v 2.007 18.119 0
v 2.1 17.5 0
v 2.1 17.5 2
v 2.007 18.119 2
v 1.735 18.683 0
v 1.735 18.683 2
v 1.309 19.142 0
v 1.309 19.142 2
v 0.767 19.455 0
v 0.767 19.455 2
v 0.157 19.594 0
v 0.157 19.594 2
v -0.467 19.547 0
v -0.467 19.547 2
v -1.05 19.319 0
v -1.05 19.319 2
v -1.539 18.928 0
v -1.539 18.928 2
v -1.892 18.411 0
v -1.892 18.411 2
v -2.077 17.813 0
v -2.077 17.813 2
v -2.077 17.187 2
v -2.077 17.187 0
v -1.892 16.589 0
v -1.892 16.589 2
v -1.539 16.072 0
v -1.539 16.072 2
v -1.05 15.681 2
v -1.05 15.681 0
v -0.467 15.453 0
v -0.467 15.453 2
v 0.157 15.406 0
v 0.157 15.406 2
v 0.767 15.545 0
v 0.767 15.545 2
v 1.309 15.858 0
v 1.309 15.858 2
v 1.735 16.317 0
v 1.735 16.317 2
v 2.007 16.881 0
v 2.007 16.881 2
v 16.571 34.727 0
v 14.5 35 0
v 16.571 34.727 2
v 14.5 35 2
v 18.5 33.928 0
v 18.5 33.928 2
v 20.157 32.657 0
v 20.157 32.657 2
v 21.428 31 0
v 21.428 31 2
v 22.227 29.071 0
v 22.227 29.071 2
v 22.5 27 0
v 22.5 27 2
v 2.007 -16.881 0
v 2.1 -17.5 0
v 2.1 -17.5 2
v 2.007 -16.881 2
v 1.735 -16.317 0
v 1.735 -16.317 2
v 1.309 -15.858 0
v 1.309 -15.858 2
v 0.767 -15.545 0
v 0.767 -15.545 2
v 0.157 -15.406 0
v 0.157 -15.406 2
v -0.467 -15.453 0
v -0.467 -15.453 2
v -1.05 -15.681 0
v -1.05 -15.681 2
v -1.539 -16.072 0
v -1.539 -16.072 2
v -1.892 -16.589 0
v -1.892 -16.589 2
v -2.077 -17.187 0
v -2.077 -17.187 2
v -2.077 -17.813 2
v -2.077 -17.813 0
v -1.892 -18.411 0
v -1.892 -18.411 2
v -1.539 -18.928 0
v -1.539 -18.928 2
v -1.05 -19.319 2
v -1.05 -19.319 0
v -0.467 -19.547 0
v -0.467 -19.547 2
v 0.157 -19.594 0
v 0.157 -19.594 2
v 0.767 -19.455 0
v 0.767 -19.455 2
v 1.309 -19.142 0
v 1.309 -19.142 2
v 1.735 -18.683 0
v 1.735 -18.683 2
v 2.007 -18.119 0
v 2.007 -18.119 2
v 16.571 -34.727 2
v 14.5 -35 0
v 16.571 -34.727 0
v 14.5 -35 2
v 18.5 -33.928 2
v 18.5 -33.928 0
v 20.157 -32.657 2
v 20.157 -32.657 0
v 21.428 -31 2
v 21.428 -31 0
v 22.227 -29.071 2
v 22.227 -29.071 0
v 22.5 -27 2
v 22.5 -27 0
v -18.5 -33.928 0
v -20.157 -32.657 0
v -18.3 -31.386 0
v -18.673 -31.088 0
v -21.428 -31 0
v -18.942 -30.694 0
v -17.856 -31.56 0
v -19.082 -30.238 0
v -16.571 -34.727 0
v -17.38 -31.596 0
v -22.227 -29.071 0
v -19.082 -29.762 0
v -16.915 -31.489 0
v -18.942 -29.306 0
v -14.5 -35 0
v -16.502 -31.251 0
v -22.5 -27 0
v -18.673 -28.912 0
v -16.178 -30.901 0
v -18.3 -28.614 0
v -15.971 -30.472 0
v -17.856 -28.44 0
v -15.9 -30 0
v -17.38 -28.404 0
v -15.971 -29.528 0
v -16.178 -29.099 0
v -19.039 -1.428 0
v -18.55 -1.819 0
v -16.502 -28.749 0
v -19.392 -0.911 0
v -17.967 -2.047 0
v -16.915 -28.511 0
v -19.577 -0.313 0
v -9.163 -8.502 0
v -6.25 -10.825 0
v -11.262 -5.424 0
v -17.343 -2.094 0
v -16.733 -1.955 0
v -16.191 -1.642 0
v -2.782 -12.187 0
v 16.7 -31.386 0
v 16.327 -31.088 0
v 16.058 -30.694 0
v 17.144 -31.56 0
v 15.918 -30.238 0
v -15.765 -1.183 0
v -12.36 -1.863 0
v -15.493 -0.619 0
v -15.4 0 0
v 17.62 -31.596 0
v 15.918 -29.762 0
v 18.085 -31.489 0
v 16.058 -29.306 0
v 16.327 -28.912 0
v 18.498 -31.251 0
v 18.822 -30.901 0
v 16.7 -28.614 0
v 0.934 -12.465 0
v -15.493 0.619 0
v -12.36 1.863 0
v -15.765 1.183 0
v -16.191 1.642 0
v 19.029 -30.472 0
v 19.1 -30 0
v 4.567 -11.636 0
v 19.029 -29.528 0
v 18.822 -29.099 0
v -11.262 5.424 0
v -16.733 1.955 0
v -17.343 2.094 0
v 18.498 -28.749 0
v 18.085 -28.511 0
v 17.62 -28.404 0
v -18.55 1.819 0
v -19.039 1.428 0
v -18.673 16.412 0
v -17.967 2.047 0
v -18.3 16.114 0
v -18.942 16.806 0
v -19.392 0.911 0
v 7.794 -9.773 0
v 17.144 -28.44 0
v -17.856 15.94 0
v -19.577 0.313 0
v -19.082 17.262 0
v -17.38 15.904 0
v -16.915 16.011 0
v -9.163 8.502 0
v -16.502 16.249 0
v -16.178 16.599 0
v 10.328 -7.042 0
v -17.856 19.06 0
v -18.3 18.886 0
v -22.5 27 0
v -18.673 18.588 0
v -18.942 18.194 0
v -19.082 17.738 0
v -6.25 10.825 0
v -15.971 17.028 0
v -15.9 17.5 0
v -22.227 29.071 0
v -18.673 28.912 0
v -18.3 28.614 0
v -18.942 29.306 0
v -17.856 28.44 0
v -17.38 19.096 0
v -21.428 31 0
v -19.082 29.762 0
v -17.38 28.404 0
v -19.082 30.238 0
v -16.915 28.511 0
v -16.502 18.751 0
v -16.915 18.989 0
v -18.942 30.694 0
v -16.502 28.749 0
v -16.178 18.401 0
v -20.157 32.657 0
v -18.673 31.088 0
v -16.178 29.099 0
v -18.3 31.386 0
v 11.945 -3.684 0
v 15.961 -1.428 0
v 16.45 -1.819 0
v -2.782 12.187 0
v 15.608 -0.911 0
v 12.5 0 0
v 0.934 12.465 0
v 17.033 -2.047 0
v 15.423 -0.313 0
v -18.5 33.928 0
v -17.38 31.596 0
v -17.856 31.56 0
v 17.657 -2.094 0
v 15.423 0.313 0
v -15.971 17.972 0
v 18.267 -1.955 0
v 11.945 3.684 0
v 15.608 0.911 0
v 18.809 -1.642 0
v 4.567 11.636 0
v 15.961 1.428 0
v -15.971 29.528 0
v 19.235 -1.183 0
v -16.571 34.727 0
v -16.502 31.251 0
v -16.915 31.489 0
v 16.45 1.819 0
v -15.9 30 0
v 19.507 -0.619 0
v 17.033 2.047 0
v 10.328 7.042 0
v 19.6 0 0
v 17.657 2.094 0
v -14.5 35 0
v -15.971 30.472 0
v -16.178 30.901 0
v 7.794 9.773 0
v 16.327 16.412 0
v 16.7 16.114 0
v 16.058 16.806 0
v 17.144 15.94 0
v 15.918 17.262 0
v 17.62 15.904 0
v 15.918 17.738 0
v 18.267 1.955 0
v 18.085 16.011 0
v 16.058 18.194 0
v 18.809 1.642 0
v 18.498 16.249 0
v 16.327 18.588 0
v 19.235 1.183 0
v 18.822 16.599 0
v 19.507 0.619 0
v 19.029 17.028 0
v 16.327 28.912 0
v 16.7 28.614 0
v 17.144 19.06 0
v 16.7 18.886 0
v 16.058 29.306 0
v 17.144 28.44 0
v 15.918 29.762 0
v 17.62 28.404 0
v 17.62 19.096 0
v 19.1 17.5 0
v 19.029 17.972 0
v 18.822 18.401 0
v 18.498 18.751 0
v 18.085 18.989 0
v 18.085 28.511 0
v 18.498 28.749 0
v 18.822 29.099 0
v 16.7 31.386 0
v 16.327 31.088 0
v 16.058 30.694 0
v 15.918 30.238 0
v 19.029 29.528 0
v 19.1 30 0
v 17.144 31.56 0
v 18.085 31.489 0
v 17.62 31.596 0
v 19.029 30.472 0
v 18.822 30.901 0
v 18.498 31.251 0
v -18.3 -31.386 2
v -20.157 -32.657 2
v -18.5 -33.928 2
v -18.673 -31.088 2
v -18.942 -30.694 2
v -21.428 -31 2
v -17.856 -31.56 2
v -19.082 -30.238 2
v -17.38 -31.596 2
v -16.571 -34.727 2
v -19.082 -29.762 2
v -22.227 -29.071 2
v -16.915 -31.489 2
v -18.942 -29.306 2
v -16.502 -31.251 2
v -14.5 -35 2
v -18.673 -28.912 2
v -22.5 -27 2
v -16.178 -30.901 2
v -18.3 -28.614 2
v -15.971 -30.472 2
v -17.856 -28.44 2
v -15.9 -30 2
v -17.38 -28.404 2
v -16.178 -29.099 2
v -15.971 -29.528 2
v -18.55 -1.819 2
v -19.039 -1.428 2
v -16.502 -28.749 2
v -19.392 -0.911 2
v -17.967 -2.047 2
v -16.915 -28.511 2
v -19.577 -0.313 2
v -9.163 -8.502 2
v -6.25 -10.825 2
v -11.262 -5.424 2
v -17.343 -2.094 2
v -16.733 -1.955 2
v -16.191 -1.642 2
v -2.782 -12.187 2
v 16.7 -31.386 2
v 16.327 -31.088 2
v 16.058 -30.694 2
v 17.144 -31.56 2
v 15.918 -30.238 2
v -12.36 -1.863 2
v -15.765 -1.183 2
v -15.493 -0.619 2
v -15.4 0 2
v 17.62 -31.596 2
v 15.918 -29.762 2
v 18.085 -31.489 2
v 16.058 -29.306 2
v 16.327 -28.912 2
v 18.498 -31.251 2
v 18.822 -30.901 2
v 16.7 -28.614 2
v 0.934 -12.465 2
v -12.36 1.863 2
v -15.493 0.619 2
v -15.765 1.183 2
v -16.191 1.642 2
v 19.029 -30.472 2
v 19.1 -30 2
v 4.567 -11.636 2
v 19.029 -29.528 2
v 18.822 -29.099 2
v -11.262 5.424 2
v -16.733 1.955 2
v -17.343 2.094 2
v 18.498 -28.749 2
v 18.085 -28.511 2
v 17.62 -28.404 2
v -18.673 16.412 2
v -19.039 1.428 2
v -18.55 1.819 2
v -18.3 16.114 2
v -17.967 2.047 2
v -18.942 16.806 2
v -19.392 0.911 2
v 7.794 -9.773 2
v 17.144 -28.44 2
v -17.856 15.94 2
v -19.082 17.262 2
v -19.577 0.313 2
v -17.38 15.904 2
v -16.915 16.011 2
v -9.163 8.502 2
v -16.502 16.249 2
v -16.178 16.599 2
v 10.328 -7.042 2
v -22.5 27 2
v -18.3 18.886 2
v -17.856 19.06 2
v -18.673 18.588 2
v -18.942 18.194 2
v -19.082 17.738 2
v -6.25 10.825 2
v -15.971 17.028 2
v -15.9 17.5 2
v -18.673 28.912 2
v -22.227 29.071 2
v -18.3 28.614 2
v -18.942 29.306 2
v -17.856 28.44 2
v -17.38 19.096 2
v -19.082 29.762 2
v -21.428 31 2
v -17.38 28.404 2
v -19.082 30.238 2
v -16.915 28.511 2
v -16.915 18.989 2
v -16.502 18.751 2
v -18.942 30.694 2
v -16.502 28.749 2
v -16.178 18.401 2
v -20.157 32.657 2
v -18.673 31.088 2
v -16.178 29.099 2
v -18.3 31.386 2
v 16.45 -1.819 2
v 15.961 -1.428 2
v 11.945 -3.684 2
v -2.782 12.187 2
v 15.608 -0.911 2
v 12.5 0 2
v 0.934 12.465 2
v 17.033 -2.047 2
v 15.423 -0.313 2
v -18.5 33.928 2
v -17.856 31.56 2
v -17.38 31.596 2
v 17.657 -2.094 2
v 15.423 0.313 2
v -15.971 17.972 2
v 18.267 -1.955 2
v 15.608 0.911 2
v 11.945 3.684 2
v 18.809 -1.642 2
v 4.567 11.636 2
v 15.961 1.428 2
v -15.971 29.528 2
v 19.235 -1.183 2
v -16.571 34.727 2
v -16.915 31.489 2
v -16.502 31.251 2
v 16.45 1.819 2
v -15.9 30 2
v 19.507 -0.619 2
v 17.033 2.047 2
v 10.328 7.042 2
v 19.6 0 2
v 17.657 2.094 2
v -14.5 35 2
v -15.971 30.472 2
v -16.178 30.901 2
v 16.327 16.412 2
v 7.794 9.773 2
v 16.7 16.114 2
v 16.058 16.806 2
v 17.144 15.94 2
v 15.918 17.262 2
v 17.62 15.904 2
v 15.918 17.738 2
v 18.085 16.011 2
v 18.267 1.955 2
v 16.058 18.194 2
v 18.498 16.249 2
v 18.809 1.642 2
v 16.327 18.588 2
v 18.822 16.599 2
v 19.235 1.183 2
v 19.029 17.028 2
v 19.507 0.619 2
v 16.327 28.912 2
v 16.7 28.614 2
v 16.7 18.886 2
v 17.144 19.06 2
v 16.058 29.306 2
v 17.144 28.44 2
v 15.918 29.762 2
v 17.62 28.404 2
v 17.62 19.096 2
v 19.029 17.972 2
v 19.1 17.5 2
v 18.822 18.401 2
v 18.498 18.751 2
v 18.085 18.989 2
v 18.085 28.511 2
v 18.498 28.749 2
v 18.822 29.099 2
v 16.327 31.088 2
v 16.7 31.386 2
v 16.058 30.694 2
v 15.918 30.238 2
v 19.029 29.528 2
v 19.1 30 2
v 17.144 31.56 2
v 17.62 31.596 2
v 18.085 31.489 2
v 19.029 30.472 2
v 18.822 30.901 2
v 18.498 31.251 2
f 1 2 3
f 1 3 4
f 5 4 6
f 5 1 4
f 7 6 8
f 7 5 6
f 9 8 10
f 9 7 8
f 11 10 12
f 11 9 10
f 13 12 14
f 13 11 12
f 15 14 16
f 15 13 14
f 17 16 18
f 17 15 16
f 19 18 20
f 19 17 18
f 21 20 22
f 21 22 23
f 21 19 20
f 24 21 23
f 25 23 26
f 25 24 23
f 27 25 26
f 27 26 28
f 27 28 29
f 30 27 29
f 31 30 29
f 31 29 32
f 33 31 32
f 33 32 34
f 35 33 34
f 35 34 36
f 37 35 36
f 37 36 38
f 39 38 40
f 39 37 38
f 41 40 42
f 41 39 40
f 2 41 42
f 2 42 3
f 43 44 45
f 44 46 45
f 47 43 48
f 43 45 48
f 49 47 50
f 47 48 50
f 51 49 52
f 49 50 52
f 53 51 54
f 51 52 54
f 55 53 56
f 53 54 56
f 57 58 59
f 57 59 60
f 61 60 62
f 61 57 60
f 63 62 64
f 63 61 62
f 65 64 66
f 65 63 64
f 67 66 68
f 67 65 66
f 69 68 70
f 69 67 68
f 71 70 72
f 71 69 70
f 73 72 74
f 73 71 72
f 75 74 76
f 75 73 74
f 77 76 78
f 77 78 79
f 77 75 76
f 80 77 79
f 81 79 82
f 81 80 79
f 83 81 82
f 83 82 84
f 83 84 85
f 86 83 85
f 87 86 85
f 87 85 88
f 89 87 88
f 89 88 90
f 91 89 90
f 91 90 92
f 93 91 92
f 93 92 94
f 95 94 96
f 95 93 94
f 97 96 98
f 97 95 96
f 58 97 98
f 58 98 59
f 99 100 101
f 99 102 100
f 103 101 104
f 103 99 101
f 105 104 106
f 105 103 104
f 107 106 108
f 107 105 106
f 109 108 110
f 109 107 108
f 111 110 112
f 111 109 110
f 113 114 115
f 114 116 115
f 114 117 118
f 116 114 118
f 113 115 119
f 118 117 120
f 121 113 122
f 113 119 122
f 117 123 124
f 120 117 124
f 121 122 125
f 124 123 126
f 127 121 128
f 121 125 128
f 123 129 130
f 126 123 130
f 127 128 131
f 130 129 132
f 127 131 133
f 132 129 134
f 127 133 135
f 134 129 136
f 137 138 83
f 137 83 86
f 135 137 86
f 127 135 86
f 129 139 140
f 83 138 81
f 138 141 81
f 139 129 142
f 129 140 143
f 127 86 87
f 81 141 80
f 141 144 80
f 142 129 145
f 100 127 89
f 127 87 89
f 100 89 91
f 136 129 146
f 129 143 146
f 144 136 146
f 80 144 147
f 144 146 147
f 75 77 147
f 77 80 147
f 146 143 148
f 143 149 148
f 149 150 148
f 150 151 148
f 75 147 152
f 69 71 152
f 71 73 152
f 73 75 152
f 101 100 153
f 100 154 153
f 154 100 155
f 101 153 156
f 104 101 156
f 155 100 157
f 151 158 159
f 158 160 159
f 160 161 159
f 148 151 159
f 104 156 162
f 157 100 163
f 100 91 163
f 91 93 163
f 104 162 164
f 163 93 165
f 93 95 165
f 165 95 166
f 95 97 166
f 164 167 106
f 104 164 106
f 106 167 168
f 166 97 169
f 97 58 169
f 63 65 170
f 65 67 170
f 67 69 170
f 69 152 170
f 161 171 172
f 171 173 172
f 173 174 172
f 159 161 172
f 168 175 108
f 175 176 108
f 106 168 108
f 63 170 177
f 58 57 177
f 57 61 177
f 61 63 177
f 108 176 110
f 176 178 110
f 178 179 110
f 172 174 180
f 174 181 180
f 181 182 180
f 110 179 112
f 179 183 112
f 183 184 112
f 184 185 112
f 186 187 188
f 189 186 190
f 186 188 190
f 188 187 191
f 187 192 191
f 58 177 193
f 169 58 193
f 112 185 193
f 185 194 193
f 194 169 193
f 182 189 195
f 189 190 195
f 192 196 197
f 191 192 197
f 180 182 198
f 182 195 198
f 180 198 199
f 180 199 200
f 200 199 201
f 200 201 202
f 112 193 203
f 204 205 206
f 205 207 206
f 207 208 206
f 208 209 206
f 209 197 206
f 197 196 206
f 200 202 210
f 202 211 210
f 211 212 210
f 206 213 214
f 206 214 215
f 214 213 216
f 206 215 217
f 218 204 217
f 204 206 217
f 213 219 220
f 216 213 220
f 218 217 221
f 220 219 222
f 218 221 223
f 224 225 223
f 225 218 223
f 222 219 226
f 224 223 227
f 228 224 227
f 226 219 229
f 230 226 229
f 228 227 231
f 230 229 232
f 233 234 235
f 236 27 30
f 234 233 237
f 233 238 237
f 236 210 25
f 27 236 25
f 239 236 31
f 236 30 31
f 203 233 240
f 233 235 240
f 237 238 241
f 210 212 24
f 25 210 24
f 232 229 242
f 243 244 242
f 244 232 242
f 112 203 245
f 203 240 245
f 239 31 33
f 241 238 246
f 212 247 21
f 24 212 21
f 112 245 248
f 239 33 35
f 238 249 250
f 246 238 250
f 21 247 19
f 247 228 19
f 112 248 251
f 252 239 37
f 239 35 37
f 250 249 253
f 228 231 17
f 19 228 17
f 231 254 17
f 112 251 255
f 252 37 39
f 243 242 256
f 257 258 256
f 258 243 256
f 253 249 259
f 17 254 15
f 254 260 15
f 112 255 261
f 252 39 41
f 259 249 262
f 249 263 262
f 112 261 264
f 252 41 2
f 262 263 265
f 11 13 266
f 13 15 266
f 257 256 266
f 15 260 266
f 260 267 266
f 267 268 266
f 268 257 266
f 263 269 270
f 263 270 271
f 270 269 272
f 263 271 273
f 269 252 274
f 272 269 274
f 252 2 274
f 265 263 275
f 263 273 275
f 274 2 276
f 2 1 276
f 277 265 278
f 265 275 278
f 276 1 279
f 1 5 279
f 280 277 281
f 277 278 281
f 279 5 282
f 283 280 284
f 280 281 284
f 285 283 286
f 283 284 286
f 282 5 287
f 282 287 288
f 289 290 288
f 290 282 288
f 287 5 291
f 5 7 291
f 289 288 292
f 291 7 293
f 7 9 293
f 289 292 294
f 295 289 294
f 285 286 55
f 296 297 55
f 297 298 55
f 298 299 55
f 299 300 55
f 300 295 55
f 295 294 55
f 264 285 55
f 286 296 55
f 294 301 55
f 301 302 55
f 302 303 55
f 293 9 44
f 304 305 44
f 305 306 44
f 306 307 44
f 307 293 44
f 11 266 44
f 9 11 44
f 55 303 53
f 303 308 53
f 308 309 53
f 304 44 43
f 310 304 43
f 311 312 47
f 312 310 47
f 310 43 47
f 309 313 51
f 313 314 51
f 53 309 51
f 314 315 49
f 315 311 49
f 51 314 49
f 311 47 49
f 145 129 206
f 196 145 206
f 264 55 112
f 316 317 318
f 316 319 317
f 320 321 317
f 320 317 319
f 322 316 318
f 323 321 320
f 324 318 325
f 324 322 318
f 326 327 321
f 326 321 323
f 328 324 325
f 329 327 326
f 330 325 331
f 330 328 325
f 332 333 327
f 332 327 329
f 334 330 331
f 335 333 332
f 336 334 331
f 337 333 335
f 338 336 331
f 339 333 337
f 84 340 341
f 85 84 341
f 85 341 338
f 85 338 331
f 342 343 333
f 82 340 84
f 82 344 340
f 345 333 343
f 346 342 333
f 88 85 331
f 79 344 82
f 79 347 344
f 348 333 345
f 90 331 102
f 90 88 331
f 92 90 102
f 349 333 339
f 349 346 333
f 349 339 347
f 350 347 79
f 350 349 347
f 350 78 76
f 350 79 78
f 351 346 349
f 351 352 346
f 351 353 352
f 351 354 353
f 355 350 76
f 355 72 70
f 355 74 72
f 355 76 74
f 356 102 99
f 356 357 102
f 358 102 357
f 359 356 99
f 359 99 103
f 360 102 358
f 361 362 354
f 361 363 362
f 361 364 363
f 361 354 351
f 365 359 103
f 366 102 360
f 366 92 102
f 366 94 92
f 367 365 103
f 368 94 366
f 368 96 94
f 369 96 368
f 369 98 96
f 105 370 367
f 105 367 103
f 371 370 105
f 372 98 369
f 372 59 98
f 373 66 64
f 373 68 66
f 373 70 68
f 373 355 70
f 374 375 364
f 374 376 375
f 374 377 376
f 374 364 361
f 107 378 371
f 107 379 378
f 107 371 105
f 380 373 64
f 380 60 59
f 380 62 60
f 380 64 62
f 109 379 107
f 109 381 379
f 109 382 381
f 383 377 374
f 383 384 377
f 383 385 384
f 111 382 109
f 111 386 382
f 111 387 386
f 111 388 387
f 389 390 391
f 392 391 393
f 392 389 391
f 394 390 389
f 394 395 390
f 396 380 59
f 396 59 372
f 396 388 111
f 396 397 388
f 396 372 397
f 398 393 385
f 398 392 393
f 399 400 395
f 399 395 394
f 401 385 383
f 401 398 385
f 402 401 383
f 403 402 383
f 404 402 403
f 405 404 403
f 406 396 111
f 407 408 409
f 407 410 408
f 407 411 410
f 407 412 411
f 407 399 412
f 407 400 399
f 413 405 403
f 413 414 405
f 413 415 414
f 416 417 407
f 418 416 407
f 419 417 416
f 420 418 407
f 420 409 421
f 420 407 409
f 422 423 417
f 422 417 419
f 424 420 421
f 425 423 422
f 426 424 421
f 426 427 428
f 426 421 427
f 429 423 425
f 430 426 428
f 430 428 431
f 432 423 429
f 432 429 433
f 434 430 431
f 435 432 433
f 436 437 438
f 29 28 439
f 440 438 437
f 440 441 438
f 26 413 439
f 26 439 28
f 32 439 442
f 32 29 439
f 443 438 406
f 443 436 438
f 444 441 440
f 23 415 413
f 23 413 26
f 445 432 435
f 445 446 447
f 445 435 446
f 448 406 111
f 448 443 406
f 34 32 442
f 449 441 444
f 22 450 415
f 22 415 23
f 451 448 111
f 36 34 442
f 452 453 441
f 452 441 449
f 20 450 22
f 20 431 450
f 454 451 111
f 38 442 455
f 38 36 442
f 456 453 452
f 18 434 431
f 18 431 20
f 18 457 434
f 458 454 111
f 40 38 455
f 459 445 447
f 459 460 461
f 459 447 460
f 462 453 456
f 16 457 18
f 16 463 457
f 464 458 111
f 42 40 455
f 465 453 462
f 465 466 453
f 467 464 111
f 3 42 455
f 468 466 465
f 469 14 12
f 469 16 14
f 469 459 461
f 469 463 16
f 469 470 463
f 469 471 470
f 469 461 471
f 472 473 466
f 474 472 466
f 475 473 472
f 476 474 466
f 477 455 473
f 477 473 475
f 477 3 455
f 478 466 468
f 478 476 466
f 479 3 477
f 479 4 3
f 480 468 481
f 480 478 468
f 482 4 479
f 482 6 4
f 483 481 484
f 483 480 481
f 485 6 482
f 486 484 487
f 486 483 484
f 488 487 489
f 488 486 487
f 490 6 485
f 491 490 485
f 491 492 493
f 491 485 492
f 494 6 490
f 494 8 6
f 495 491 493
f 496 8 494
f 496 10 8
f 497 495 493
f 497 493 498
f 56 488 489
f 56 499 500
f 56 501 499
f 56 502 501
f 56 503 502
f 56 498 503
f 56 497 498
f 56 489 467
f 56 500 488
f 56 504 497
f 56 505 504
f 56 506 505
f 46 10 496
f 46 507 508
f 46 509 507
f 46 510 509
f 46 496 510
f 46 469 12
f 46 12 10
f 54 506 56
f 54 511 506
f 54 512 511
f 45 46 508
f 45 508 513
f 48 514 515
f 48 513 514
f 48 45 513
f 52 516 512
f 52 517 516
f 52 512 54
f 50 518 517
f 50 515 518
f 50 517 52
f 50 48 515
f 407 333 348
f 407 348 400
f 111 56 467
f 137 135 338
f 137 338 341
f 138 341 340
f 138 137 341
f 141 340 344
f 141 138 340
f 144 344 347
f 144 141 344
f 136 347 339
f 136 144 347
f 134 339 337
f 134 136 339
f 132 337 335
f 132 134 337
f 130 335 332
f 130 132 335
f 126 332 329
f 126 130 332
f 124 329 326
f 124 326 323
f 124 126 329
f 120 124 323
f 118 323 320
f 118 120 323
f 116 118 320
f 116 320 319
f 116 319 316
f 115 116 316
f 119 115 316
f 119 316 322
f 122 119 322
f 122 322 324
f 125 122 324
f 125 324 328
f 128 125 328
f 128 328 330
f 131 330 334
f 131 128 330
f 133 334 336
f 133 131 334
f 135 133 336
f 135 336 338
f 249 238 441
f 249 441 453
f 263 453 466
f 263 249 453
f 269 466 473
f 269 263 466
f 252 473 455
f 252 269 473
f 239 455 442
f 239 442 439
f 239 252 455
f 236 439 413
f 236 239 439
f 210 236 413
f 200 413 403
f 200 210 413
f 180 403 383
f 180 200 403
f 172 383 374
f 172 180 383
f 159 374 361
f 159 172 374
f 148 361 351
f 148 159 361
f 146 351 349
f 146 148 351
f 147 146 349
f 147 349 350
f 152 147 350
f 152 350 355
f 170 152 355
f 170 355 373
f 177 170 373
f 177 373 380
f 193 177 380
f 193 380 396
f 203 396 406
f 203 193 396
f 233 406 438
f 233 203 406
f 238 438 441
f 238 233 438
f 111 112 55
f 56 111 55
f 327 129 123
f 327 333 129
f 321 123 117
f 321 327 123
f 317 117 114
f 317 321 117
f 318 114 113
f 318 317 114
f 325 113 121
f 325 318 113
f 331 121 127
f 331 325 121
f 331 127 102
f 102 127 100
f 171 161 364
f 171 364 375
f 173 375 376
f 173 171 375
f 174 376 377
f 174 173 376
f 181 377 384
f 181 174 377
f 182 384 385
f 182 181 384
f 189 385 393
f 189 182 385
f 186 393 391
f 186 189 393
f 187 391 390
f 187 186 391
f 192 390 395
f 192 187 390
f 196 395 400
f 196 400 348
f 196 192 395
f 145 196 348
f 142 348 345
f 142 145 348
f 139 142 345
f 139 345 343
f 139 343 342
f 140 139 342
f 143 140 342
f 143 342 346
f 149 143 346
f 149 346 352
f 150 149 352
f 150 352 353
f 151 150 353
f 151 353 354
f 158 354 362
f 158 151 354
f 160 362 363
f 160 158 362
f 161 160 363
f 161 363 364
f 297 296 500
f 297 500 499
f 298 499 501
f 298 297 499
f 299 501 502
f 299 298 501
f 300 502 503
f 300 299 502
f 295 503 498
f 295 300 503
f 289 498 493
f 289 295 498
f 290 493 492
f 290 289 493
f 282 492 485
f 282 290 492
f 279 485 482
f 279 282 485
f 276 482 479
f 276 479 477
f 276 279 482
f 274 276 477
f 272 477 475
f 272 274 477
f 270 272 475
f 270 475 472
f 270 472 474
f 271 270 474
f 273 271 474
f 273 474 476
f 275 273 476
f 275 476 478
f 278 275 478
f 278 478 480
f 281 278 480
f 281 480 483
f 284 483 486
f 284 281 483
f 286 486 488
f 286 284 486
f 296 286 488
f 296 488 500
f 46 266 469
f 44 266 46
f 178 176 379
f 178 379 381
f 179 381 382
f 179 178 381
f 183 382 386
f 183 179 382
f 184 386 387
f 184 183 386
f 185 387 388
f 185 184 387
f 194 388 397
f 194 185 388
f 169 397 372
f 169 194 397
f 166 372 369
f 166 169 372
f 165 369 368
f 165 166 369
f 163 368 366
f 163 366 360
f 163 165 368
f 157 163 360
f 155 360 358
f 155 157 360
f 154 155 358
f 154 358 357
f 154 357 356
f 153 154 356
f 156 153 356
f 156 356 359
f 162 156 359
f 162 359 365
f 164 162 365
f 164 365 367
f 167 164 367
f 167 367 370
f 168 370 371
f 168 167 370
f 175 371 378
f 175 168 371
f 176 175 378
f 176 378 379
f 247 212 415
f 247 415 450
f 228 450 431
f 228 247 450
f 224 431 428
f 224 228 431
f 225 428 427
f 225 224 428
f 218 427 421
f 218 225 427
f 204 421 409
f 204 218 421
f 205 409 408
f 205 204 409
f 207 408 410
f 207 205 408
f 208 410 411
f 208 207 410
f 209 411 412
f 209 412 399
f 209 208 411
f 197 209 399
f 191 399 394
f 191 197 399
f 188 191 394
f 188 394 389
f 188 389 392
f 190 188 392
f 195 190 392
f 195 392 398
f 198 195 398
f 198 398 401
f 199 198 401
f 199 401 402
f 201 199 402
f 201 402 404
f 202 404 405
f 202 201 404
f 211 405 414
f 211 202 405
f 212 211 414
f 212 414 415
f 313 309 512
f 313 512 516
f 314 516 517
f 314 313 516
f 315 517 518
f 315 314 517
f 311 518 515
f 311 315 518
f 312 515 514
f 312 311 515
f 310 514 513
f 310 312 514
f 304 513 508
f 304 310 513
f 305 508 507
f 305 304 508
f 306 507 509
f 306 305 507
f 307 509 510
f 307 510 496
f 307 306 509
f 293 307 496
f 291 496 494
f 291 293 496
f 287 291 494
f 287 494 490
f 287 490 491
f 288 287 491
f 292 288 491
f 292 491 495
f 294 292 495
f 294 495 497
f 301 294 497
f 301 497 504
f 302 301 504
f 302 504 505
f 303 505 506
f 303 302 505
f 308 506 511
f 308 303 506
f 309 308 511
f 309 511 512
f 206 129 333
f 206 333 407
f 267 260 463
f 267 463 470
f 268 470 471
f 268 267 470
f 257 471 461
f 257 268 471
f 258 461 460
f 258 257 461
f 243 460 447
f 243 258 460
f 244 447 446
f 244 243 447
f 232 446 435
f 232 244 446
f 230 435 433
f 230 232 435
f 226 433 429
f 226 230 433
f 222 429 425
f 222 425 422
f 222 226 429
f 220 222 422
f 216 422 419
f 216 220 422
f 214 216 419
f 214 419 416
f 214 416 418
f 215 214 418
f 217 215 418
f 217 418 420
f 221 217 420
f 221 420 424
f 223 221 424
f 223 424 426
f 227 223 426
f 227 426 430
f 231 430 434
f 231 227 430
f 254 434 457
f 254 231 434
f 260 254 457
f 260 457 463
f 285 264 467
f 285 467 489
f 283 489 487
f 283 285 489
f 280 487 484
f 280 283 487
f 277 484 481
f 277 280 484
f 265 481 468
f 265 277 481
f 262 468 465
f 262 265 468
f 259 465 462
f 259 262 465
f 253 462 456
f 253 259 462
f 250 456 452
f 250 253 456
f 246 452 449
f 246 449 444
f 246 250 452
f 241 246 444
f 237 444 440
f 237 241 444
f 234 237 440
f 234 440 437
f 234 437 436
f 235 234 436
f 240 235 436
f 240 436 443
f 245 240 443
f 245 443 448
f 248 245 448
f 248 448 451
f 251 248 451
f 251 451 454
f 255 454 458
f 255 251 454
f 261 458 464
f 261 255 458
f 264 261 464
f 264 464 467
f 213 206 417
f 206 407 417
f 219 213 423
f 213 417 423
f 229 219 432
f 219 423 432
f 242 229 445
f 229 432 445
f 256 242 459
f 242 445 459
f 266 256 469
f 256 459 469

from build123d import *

# Parameters (mm, degrees)
SKETCH_1_W      = 45
SKETCH_1_H      = 70
SKETCH_1_R      = 2.1
SKETCH_1_R_2    = 12.5
SKETCH_1_R_3    = 1.6
EXTRUDE_1_DEPTH = 2
FILLET_1_R      = 8


with BuildPart() as part:
    # ｽｹｯﾁ1 → ﾎﾞｽ - 押し出し1 (new body)
    with BuildSketch(Plane.XY):
        Rectangle(SKETCH_1_W, SKETCH_1_H)
        with Locations((-17.5, 0)):
            Circle(SKETCH_1_R, mode=Mode.SUBTRACT)
        with Locations((0, 17.5)):
            Circle(SKETCH_1_R, mode=Mode.SUBTRACT)
        with Locations((17.5, 0)):
            Circle(SKETCH_1_R, mode=Mode.SUBTRACT)
        with Locations((0, -17.5)):
            Circle(SKETCH_1_R, mode=Mode.SUBTRACT)
        Circle(SKETCH_1_R_2, mode=Mode.SUBTRACT)
        with Locations((-17.5, 30)):
            Circle(SKETCH_1_R_3, mode=Mode.SUBTRACT)
        with Locations((17.5, 30)):
            Circle(SKETCH_1_R_3, mode=Mode.SUBTRACT)
        with Locations((-17.5, -30)):
            Circle(SKETCH_1_R_3, mode=Mode.SUBTRACT)
        with Locations((17.5, -30)):
            Circle(SKETCH_1_R_3, mode=Mode.SUBTRACT)
        with Locations((-17.5, 17.5)):
            Circle(SKETCH_1_R_3, mode=Mode.SUBTRACT)
        with Locations((17.5, 17.5)):
            Circle(SKETCH_1_R_3, mode=Mode.SUBTRACT)
    extrude(amount=EXTRUDE_1_DEPTH)

    # ﾌｨﾚｯﾄ1
    fillet_1_edges = [part.edges().sort_by_distance(p)[0] for p in [
        (-22.5, 35, 1),
        (22.5, 35, 1),
        (22.5, -35, 1),
        (-22.5, -35, 1),
    ]]
    fillet(fillet_1_edges, radius=FILLET_1_R)


solid = part.part
